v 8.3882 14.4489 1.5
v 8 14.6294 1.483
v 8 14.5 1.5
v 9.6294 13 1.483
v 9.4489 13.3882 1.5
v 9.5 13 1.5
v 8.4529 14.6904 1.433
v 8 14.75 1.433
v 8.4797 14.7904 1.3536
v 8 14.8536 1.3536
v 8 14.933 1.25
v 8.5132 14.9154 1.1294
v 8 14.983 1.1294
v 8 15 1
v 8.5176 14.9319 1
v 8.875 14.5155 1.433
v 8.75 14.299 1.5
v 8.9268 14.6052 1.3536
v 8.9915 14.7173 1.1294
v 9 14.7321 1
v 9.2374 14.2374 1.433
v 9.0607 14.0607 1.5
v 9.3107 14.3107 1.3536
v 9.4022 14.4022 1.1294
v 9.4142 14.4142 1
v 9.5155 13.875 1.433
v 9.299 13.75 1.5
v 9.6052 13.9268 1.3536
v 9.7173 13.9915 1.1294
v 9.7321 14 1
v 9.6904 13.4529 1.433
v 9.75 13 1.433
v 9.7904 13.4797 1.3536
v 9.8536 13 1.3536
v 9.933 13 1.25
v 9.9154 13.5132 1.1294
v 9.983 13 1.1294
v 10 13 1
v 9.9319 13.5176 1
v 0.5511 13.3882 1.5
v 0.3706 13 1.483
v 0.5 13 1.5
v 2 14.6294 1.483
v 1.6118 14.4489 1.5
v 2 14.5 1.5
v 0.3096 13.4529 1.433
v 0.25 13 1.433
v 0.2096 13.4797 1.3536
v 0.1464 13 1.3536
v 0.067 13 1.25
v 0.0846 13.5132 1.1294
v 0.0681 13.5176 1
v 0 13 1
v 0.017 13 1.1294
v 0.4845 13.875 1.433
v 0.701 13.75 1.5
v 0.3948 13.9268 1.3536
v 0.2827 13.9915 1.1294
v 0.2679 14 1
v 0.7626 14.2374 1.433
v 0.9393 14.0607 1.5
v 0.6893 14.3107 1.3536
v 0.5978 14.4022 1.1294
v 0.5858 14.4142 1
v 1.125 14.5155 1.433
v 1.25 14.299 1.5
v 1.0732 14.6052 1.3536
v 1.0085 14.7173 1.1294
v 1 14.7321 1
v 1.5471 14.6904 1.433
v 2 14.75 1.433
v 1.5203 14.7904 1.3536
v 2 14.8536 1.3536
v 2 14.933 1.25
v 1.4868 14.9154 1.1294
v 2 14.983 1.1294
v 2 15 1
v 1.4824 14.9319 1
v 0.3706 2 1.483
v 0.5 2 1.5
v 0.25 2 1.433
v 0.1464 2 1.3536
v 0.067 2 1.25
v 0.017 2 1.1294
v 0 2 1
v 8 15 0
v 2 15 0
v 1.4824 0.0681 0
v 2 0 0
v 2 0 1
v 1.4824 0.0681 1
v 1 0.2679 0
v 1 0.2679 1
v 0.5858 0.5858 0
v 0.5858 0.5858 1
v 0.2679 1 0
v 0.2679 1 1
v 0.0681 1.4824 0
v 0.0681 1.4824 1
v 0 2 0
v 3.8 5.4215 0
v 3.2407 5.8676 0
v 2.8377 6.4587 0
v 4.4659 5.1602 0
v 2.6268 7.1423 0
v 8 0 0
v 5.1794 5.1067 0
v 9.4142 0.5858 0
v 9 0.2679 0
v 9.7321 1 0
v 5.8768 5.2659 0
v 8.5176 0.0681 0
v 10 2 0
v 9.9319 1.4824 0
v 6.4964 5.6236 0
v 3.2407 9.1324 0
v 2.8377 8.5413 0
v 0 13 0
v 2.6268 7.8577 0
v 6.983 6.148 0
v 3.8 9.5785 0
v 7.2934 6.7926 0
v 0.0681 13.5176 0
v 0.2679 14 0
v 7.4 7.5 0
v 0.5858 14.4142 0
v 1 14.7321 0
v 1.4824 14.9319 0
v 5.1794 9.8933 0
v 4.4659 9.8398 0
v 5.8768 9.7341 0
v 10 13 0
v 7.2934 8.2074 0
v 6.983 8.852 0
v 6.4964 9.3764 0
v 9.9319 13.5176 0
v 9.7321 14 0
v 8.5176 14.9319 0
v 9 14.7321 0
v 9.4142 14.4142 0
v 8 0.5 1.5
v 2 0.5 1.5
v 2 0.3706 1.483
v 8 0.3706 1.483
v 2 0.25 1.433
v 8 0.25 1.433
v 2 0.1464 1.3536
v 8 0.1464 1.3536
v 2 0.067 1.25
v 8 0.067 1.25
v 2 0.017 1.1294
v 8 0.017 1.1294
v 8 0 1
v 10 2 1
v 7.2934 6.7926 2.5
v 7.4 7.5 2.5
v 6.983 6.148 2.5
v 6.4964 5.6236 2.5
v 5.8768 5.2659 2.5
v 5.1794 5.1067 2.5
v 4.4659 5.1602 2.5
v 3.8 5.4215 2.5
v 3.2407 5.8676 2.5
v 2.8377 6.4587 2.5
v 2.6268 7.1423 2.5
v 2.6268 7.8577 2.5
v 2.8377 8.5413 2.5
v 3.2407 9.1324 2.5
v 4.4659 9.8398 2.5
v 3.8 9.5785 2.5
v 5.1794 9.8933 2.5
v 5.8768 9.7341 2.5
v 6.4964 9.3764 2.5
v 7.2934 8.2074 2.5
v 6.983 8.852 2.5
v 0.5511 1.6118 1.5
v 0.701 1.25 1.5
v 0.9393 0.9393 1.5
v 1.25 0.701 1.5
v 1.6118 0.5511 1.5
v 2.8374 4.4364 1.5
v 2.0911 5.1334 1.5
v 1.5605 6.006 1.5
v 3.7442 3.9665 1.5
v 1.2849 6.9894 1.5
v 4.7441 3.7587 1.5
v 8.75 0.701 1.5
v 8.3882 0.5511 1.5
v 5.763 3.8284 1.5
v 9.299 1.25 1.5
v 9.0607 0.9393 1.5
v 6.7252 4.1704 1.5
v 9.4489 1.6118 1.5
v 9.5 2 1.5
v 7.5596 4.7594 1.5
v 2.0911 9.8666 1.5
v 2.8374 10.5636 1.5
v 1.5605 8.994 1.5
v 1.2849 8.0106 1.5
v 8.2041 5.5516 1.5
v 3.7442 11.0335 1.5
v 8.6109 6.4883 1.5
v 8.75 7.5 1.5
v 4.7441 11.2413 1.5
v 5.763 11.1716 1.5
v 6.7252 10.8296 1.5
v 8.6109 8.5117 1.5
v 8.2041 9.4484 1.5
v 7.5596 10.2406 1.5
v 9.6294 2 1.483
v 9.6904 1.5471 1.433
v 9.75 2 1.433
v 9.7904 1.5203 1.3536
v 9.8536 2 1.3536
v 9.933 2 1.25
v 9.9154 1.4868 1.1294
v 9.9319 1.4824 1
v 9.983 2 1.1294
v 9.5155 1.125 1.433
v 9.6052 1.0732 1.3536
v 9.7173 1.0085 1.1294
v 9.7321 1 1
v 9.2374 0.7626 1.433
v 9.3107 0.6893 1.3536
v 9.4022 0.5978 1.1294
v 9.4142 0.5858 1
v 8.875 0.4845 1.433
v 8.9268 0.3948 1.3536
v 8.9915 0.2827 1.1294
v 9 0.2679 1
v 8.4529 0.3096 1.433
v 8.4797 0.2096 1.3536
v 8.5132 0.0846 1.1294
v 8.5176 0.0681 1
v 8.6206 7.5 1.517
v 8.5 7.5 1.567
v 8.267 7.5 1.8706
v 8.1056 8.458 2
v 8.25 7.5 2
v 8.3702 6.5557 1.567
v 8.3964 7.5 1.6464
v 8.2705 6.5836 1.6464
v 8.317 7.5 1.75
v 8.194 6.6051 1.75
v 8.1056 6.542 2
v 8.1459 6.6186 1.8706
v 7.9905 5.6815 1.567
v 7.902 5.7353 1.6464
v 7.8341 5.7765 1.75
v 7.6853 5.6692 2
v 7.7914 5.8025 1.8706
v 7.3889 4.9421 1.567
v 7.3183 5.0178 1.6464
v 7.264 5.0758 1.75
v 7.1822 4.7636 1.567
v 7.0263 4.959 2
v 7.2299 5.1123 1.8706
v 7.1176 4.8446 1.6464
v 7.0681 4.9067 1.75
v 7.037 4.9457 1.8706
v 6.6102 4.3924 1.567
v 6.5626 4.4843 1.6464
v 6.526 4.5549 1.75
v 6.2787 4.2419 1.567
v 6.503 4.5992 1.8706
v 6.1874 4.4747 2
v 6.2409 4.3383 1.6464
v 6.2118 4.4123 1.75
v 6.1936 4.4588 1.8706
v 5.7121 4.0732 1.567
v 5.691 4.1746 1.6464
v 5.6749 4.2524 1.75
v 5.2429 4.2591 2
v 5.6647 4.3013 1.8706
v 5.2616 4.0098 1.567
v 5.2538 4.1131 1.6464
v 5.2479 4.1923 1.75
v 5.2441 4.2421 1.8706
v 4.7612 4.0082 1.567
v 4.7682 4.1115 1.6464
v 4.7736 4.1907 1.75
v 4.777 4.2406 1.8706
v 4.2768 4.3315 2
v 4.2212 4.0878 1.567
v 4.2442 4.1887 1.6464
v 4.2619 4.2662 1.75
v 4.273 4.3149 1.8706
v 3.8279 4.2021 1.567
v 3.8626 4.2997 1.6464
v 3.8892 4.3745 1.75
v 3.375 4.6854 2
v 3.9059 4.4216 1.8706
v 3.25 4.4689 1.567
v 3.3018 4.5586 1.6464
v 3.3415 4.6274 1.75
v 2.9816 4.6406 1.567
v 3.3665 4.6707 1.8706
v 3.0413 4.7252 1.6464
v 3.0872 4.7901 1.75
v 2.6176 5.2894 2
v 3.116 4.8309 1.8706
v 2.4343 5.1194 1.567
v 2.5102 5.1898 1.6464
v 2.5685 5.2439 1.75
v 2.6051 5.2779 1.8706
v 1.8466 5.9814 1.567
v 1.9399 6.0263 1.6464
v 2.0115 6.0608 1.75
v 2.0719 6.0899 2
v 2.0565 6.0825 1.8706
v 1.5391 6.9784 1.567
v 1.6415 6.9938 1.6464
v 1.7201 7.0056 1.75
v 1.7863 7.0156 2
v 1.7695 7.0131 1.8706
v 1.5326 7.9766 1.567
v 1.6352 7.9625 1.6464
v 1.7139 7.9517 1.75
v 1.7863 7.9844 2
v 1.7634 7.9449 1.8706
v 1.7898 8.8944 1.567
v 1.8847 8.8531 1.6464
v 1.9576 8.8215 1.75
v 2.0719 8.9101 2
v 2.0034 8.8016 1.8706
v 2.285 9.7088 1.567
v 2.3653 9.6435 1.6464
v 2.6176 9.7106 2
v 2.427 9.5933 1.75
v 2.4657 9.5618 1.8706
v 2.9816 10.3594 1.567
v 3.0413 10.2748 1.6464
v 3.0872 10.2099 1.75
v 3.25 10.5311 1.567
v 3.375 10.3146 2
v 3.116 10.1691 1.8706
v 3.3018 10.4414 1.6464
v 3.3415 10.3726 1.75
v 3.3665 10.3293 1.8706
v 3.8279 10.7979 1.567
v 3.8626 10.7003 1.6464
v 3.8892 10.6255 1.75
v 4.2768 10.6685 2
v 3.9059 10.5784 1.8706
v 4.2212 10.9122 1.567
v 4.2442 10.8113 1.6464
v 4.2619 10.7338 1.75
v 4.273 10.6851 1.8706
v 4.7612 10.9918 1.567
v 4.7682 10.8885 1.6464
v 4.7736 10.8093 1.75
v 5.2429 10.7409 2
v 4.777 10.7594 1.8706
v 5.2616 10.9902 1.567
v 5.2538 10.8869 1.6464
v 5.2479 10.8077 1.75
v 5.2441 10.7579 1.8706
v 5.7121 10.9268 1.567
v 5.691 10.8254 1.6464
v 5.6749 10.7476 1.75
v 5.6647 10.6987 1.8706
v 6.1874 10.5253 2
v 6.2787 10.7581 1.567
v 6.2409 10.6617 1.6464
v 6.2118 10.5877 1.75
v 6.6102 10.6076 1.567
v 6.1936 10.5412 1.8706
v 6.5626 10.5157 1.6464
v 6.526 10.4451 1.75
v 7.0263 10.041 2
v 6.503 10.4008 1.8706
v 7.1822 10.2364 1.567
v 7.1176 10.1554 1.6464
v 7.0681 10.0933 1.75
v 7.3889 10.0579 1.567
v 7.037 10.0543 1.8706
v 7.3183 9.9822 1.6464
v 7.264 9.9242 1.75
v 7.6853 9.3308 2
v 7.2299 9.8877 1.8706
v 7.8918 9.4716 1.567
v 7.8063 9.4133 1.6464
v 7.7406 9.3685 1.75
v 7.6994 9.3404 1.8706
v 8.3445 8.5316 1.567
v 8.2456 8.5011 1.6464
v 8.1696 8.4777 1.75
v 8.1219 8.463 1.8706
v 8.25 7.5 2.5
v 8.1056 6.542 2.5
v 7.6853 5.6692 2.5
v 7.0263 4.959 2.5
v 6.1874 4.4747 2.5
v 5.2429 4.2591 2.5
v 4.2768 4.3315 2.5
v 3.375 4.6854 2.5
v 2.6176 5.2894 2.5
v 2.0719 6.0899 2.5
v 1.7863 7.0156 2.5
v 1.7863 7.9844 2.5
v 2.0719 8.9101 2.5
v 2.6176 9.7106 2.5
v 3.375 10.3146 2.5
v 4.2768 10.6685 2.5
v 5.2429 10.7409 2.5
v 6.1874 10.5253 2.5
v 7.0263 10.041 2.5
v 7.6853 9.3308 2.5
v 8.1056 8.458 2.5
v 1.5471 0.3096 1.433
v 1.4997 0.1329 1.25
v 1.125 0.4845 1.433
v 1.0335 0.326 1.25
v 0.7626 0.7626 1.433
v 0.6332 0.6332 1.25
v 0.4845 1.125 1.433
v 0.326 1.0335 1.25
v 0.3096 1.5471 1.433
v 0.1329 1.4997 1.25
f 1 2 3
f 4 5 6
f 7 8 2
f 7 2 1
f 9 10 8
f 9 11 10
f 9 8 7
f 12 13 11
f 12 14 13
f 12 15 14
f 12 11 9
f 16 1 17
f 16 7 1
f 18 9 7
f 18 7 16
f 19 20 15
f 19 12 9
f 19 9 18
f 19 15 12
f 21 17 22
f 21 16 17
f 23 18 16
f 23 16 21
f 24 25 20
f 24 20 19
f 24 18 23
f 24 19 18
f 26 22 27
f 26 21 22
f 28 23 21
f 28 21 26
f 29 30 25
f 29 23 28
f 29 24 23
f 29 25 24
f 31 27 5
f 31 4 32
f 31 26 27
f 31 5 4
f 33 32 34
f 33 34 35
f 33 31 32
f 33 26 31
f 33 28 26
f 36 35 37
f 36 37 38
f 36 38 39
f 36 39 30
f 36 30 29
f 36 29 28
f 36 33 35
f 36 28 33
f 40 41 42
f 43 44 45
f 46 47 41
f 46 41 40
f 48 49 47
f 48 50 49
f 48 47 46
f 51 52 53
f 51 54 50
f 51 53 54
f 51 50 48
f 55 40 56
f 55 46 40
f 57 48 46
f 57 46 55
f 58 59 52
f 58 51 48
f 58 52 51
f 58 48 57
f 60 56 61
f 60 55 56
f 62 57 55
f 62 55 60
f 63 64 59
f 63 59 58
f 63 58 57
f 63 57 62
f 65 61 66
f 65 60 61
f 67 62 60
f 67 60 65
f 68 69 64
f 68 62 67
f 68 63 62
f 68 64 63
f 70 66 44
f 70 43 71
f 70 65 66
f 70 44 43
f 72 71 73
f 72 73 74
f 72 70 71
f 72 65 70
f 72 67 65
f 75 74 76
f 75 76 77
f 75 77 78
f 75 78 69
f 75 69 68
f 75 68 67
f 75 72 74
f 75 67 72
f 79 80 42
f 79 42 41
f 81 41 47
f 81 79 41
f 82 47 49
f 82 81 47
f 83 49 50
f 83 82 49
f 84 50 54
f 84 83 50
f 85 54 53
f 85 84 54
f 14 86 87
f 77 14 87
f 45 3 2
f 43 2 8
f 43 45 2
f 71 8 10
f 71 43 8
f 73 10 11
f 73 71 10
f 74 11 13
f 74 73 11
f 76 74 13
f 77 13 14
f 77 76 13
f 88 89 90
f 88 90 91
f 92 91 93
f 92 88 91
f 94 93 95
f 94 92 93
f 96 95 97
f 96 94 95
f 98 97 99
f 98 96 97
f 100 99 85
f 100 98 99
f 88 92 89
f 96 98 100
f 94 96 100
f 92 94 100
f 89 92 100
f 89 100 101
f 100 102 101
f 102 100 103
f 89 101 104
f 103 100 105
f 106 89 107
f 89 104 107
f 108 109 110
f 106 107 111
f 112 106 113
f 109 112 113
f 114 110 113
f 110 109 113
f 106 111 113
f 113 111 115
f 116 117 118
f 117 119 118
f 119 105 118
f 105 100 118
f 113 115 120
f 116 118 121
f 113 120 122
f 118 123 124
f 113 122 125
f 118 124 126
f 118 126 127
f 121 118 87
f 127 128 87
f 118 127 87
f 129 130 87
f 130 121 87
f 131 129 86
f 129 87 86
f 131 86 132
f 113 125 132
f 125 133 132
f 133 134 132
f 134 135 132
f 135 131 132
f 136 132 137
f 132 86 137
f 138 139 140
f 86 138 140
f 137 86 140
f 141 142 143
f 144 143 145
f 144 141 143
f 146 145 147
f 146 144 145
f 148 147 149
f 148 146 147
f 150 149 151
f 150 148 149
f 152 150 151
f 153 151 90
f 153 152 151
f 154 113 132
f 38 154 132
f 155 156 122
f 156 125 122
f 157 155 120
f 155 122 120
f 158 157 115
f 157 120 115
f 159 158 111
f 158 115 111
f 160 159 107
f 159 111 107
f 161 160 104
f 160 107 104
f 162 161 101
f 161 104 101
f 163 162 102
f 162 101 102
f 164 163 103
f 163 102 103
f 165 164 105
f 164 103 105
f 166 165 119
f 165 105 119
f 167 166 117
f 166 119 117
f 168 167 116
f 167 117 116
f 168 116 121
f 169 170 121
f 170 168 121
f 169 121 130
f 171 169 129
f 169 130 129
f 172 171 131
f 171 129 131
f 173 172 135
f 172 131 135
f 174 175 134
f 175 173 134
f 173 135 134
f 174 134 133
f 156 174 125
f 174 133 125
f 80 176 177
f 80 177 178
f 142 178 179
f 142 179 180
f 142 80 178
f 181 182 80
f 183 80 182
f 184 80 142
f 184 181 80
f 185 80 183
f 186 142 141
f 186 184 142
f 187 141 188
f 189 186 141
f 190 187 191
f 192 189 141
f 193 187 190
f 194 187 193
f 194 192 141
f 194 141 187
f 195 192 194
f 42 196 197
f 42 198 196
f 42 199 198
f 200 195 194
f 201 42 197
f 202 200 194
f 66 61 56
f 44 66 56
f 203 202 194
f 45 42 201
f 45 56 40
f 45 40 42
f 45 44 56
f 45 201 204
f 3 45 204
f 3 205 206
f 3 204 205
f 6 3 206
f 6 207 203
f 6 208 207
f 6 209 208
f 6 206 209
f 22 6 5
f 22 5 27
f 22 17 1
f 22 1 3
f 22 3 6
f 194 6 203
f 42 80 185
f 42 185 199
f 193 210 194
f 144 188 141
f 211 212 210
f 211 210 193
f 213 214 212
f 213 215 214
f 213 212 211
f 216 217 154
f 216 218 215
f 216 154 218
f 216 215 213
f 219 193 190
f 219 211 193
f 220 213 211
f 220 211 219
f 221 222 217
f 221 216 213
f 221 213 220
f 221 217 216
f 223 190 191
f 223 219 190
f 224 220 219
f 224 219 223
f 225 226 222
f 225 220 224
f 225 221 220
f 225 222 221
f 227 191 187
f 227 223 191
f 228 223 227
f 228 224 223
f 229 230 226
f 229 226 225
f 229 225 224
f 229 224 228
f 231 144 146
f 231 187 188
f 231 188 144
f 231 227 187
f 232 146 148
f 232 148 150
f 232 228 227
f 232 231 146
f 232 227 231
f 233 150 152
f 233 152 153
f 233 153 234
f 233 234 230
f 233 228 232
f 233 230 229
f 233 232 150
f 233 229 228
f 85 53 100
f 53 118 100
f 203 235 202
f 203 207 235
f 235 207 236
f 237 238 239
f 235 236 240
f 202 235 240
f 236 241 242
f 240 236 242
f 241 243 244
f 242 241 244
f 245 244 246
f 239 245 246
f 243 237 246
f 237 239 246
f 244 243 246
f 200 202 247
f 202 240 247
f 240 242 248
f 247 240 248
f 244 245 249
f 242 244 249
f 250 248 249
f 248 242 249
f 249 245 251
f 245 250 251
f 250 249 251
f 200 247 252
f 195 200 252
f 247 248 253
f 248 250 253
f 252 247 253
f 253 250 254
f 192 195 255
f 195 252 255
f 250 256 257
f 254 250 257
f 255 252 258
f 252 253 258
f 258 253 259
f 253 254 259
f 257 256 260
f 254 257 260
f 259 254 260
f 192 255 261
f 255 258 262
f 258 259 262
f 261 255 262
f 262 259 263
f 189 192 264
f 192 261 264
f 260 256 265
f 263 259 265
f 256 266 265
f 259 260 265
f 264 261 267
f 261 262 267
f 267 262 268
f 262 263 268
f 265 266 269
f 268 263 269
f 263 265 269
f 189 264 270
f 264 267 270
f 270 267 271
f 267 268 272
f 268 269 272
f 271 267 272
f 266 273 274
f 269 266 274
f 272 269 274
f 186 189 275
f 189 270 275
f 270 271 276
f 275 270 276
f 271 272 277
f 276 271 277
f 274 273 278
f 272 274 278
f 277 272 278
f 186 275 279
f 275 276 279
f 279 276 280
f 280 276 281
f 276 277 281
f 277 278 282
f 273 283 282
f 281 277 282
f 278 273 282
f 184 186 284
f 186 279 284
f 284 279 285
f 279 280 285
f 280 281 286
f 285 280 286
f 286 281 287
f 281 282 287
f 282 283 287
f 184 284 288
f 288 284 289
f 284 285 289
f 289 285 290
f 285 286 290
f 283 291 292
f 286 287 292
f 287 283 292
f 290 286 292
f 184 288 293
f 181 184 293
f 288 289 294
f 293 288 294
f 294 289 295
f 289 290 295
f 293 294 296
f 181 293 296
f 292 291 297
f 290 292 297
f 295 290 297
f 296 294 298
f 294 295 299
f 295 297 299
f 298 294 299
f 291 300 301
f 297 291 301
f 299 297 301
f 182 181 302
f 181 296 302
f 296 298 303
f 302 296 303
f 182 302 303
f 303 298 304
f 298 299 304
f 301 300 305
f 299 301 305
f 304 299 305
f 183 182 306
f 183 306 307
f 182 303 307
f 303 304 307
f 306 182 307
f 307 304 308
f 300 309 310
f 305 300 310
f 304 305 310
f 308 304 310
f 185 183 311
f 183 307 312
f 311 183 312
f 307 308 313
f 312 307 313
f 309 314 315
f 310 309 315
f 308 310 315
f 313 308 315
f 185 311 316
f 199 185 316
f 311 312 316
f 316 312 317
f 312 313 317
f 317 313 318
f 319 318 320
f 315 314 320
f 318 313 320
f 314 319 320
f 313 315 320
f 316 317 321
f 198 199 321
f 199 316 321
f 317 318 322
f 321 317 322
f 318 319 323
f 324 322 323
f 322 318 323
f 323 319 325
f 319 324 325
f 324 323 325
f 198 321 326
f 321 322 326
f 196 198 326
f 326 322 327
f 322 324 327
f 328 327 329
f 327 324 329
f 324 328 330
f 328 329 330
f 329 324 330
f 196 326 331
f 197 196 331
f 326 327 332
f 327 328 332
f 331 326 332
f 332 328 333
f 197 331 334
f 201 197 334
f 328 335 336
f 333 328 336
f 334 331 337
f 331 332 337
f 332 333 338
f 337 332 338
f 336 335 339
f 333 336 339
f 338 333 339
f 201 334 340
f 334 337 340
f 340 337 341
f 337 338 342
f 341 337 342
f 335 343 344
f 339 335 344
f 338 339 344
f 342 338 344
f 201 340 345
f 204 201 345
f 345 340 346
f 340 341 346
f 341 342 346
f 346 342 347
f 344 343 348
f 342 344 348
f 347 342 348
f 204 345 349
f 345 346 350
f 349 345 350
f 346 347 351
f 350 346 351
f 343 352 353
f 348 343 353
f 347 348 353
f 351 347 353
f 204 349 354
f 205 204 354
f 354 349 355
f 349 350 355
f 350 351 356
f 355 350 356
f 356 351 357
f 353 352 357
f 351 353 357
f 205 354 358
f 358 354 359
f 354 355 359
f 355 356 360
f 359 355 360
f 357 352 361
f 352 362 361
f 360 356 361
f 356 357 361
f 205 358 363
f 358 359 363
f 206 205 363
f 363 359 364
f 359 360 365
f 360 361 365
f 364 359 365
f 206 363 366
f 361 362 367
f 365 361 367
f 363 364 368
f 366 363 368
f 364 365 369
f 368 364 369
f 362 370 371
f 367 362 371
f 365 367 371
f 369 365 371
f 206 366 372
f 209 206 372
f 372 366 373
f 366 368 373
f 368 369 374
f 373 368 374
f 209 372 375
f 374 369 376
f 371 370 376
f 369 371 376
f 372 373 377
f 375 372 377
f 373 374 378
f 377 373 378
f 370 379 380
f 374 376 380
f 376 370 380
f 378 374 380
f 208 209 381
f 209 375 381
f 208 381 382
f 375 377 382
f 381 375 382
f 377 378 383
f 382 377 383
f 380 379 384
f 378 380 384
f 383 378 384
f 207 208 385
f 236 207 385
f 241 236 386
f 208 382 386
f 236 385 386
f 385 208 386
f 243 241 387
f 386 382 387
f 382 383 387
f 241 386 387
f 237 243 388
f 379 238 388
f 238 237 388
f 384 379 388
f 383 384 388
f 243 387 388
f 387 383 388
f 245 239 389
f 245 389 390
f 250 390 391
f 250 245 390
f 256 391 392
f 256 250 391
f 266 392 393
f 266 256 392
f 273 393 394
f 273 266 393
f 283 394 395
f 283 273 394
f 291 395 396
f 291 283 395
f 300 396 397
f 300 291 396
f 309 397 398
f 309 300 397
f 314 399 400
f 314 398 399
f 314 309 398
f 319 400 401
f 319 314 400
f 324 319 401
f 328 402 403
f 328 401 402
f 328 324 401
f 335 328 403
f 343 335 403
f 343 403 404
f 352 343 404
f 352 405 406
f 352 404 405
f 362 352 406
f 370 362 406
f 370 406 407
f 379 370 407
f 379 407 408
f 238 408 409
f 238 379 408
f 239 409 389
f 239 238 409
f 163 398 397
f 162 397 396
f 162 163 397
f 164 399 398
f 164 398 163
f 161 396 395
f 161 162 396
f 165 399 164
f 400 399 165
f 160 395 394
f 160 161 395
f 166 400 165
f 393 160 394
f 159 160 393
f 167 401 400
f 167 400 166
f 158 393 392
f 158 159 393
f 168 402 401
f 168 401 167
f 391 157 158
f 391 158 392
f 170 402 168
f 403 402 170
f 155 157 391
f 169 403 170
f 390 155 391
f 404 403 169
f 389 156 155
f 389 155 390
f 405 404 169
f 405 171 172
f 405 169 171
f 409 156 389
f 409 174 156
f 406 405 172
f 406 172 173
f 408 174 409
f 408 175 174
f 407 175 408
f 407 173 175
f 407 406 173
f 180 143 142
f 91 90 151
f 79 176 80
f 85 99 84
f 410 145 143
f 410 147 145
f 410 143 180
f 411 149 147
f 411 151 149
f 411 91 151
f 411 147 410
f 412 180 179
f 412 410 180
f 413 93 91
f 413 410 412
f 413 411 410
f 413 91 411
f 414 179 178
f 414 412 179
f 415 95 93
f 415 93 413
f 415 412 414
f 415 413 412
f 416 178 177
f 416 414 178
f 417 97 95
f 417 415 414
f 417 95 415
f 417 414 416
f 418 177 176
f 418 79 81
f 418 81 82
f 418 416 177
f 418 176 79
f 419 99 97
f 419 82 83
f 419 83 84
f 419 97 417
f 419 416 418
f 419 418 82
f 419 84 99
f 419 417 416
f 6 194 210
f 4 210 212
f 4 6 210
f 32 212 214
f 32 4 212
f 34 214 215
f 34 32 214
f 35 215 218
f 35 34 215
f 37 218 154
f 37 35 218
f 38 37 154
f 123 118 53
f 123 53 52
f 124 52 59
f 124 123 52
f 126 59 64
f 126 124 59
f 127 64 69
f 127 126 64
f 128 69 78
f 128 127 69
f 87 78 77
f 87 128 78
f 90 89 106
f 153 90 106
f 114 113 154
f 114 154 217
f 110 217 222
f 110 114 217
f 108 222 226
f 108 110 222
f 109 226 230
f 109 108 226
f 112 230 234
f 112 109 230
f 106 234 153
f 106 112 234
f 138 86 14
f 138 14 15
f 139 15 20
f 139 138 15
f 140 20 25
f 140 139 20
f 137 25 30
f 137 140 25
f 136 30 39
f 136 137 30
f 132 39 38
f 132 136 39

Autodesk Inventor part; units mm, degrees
ref_plane "YZ Plane" through (0, 0, 0) normal (1, 0, 0) x (0, 1, 0)
ref_plane "XZ Plane" through (0, 0, 0) normal (0, 1, 0) x (-1, 0, 0)
ref_plane "XY Plane" through (0, 0, 0) normal (0, 0, 1) x (1, 0, 0)
sketch "Sketch1" plane through (0, 0, 0) normal (0, 0, 1) x (1, 0, 0)
  line L0 (2, 0) -> (8, 0)
  line L1 (10, 2) -> (10, 13)
  line L2 (8, 15) -> (2, 15)
  line L3 (0, 13) -> (0, 2)
  circle A0 centre (5, 7.5) radius 2.4
  arc A1 (10, 13) -> (8, 15) centre (8, 13) ccw
  arc A2 (2, 15) -> (0, 13) centre (2, 13) ccw
  arc A3 (0, 2) -> (2, 0) centre (2, 2) ccw
  arc A4 (8, 0) -> (10, 2) centre (8, 2) ccw
  point P0 (0, 0)
  point P1 (10, 15)
  point P2 (10, 0)
  point P3 (0, 15)
  dimension "d0" = 10
  dimension "d1" = 15
  dimension "d2" = 4.8
  dimension "d3" = 2
extrude "Extrusion1" add sketch "Sketch1" along normal blind 1.5
sketch "Sketch2" plane through (0, 0, 1.5) normal (0, 0, 1) x (1, 0, 0)
  circle A0 centre (5, 7.5) radius 2.4 projected
  circle A1 centre (5, 7.5) radius 3.25
  point P0 (0, 0)
  dimension "d6" = 6.5
extrude "Extrusion2" add sketch "Sketch2" along normal blind 1
fillet "Fillet1" radius 0.5 1 edges at (1.75, 7.5, 1.5)
thread "Thread1" size "M5x0.8" class "6H" standard "ANSI Metric M Profile" full length
fillet "Fillet2" radius 0.5 8 edges at (0.5858, 0.5858, 1.5) (5, 0, 1.5) (9.4142, 0.5858, 1.5) (10, 7.5, 1.5) (9.4142, 14.4142, 1.5) (5, 15, 1.5) (0.5858, 14.4142, 1.5) (0, 7.5, 1.5)
properties part number "M5 Tee Nut"
